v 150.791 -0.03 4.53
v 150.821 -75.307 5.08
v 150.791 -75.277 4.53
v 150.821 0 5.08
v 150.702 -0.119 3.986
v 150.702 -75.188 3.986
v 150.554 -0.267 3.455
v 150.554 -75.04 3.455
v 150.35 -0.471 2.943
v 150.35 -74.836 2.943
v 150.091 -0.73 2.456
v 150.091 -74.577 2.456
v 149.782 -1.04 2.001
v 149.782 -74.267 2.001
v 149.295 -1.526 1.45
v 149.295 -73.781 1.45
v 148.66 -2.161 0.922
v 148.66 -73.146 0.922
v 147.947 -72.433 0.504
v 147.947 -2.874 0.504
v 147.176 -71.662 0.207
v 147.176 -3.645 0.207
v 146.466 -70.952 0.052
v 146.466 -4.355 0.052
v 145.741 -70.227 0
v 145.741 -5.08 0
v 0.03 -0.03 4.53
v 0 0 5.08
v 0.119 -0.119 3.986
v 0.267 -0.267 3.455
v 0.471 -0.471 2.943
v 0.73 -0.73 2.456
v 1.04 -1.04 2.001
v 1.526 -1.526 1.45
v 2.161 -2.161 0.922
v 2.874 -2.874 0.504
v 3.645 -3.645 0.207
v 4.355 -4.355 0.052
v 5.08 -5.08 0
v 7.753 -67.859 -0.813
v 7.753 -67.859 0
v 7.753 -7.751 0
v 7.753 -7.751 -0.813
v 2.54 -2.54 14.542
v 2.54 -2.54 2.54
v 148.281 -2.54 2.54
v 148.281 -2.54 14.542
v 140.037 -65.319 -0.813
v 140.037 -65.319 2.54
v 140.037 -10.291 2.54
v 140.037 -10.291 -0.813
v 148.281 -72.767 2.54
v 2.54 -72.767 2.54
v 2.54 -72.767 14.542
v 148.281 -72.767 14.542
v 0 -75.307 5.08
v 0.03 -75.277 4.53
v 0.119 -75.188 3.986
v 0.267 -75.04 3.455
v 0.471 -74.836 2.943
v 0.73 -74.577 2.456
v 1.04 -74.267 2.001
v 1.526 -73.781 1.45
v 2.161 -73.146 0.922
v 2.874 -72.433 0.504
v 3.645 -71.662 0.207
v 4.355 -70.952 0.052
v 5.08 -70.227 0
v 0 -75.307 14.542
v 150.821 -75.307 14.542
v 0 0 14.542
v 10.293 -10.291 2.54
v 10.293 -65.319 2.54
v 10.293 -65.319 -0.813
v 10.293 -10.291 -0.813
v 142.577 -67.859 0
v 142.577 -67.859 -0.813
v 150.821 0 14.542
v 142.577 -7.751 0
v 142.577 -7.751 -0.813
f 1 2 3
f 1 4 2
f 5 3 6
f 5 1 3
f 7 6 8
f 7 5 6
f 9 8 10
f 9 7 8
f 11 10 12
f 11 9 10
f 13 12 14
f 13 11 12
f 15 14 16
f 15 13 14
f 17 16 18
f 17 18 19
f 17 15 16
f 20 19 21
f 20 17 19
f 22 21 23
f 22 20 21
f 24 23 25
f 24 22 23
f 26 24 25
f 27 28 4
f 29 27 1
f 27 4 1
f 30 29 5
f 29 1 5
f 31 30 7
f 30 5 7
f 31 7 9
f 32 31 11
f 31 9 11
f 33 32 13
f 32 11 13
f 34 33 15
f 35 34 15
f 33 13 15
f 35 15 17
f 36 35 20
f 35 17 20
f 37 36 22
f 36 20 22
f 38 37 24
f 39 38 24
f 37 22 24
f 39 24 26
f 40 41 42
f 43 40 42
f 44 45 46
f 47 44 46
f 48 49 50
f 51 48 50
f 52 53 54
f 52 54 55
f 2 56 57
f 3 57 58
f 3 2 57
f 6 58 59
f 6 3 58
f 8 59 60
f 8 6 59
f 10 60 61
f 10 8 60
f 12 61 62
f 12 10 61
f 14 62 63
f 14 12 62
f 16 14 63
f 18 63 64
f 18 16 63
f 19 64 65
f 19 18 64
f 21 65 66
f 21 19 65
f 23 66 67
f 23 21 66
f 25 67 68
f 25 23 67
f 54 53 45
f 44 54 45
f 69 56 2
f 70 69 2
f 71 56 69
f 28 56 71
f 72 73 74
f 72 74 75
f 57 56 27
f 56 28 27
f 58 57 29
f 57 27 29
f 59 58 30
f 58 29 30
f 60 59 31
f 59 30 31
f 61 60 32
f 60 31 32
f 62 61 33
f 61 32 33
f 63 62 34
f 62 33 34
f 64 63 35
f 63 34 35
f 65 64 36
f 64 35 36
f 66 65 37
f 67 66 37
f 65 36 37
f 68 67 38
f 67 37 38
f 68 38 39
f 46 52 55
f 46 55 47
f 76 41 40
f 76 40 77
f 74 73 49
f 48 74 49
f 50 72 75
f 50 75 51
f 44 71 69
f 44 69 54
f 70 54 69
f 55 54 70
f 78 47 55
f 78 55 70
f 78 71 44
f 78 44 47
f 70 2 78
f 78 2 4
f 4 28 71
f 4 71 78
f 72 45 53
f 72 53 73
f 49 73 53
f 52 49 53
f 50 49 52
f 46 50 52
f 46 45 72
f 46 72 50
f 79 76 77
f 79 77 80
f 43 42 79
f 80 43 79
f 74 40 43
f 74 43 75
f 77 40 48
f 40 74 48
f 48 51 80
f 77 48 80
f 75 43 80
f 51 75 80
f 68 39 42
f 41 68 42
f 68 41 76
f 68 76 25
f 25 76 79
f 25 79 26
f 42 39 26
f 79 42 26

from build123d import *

# Parameters (mm, degrees)
F0_W     = 150.8212983608
F0_H     = 75.3069221973
F1_DEPTH = 14.5422648638
F2_W     = 134.8242838867
F2_H     = 60.1080209017
F3_DEPTH = 15.3549909592
F4_T     = -2.54
F5_R     = 5.08


with BuildPart() as f1:
    # F0 (on Top) → F1 (new body)
    with BuildSketch(Plane.XY):
        with Locations((75.4106491804, -37.6534610987)):
            Rectangle(F0_W, F0_H)
    extrude(amount=F1_DEPTH)

    # F2 (on face) → F3 (join)
    with BuildSketch(Plane.XY.offset(14.5422648638)):
        with Locations((75.1646866556, -37.8053411841)):
            Rectangle(F2_W, F2_H)
    extrude(amount=-F3_DEPTH)

    # F4
    f4_openings = [f1.faces().sort_by_distance(p)[0] for p in [
        (75.164687, -37.805341, -0.812726),
        (75.410649, -37.653461, 14.542265),
    ]]
    offset(amount=F4_T, openings=f4_openings, kind=Kind.INTERSECTION)

    # F5
    f5_edges = [f1.edges().sort_by_distance(p)[0] for p in [
        (75.410649, -75.306922, 0),
        (75.410649, 0, 0),
        (150.821298, -37.653461, 0),
        (0, -37.653461, 0),
    ]]
    fillet(f5_edges, radius=F5_R)


solid = f1.part
